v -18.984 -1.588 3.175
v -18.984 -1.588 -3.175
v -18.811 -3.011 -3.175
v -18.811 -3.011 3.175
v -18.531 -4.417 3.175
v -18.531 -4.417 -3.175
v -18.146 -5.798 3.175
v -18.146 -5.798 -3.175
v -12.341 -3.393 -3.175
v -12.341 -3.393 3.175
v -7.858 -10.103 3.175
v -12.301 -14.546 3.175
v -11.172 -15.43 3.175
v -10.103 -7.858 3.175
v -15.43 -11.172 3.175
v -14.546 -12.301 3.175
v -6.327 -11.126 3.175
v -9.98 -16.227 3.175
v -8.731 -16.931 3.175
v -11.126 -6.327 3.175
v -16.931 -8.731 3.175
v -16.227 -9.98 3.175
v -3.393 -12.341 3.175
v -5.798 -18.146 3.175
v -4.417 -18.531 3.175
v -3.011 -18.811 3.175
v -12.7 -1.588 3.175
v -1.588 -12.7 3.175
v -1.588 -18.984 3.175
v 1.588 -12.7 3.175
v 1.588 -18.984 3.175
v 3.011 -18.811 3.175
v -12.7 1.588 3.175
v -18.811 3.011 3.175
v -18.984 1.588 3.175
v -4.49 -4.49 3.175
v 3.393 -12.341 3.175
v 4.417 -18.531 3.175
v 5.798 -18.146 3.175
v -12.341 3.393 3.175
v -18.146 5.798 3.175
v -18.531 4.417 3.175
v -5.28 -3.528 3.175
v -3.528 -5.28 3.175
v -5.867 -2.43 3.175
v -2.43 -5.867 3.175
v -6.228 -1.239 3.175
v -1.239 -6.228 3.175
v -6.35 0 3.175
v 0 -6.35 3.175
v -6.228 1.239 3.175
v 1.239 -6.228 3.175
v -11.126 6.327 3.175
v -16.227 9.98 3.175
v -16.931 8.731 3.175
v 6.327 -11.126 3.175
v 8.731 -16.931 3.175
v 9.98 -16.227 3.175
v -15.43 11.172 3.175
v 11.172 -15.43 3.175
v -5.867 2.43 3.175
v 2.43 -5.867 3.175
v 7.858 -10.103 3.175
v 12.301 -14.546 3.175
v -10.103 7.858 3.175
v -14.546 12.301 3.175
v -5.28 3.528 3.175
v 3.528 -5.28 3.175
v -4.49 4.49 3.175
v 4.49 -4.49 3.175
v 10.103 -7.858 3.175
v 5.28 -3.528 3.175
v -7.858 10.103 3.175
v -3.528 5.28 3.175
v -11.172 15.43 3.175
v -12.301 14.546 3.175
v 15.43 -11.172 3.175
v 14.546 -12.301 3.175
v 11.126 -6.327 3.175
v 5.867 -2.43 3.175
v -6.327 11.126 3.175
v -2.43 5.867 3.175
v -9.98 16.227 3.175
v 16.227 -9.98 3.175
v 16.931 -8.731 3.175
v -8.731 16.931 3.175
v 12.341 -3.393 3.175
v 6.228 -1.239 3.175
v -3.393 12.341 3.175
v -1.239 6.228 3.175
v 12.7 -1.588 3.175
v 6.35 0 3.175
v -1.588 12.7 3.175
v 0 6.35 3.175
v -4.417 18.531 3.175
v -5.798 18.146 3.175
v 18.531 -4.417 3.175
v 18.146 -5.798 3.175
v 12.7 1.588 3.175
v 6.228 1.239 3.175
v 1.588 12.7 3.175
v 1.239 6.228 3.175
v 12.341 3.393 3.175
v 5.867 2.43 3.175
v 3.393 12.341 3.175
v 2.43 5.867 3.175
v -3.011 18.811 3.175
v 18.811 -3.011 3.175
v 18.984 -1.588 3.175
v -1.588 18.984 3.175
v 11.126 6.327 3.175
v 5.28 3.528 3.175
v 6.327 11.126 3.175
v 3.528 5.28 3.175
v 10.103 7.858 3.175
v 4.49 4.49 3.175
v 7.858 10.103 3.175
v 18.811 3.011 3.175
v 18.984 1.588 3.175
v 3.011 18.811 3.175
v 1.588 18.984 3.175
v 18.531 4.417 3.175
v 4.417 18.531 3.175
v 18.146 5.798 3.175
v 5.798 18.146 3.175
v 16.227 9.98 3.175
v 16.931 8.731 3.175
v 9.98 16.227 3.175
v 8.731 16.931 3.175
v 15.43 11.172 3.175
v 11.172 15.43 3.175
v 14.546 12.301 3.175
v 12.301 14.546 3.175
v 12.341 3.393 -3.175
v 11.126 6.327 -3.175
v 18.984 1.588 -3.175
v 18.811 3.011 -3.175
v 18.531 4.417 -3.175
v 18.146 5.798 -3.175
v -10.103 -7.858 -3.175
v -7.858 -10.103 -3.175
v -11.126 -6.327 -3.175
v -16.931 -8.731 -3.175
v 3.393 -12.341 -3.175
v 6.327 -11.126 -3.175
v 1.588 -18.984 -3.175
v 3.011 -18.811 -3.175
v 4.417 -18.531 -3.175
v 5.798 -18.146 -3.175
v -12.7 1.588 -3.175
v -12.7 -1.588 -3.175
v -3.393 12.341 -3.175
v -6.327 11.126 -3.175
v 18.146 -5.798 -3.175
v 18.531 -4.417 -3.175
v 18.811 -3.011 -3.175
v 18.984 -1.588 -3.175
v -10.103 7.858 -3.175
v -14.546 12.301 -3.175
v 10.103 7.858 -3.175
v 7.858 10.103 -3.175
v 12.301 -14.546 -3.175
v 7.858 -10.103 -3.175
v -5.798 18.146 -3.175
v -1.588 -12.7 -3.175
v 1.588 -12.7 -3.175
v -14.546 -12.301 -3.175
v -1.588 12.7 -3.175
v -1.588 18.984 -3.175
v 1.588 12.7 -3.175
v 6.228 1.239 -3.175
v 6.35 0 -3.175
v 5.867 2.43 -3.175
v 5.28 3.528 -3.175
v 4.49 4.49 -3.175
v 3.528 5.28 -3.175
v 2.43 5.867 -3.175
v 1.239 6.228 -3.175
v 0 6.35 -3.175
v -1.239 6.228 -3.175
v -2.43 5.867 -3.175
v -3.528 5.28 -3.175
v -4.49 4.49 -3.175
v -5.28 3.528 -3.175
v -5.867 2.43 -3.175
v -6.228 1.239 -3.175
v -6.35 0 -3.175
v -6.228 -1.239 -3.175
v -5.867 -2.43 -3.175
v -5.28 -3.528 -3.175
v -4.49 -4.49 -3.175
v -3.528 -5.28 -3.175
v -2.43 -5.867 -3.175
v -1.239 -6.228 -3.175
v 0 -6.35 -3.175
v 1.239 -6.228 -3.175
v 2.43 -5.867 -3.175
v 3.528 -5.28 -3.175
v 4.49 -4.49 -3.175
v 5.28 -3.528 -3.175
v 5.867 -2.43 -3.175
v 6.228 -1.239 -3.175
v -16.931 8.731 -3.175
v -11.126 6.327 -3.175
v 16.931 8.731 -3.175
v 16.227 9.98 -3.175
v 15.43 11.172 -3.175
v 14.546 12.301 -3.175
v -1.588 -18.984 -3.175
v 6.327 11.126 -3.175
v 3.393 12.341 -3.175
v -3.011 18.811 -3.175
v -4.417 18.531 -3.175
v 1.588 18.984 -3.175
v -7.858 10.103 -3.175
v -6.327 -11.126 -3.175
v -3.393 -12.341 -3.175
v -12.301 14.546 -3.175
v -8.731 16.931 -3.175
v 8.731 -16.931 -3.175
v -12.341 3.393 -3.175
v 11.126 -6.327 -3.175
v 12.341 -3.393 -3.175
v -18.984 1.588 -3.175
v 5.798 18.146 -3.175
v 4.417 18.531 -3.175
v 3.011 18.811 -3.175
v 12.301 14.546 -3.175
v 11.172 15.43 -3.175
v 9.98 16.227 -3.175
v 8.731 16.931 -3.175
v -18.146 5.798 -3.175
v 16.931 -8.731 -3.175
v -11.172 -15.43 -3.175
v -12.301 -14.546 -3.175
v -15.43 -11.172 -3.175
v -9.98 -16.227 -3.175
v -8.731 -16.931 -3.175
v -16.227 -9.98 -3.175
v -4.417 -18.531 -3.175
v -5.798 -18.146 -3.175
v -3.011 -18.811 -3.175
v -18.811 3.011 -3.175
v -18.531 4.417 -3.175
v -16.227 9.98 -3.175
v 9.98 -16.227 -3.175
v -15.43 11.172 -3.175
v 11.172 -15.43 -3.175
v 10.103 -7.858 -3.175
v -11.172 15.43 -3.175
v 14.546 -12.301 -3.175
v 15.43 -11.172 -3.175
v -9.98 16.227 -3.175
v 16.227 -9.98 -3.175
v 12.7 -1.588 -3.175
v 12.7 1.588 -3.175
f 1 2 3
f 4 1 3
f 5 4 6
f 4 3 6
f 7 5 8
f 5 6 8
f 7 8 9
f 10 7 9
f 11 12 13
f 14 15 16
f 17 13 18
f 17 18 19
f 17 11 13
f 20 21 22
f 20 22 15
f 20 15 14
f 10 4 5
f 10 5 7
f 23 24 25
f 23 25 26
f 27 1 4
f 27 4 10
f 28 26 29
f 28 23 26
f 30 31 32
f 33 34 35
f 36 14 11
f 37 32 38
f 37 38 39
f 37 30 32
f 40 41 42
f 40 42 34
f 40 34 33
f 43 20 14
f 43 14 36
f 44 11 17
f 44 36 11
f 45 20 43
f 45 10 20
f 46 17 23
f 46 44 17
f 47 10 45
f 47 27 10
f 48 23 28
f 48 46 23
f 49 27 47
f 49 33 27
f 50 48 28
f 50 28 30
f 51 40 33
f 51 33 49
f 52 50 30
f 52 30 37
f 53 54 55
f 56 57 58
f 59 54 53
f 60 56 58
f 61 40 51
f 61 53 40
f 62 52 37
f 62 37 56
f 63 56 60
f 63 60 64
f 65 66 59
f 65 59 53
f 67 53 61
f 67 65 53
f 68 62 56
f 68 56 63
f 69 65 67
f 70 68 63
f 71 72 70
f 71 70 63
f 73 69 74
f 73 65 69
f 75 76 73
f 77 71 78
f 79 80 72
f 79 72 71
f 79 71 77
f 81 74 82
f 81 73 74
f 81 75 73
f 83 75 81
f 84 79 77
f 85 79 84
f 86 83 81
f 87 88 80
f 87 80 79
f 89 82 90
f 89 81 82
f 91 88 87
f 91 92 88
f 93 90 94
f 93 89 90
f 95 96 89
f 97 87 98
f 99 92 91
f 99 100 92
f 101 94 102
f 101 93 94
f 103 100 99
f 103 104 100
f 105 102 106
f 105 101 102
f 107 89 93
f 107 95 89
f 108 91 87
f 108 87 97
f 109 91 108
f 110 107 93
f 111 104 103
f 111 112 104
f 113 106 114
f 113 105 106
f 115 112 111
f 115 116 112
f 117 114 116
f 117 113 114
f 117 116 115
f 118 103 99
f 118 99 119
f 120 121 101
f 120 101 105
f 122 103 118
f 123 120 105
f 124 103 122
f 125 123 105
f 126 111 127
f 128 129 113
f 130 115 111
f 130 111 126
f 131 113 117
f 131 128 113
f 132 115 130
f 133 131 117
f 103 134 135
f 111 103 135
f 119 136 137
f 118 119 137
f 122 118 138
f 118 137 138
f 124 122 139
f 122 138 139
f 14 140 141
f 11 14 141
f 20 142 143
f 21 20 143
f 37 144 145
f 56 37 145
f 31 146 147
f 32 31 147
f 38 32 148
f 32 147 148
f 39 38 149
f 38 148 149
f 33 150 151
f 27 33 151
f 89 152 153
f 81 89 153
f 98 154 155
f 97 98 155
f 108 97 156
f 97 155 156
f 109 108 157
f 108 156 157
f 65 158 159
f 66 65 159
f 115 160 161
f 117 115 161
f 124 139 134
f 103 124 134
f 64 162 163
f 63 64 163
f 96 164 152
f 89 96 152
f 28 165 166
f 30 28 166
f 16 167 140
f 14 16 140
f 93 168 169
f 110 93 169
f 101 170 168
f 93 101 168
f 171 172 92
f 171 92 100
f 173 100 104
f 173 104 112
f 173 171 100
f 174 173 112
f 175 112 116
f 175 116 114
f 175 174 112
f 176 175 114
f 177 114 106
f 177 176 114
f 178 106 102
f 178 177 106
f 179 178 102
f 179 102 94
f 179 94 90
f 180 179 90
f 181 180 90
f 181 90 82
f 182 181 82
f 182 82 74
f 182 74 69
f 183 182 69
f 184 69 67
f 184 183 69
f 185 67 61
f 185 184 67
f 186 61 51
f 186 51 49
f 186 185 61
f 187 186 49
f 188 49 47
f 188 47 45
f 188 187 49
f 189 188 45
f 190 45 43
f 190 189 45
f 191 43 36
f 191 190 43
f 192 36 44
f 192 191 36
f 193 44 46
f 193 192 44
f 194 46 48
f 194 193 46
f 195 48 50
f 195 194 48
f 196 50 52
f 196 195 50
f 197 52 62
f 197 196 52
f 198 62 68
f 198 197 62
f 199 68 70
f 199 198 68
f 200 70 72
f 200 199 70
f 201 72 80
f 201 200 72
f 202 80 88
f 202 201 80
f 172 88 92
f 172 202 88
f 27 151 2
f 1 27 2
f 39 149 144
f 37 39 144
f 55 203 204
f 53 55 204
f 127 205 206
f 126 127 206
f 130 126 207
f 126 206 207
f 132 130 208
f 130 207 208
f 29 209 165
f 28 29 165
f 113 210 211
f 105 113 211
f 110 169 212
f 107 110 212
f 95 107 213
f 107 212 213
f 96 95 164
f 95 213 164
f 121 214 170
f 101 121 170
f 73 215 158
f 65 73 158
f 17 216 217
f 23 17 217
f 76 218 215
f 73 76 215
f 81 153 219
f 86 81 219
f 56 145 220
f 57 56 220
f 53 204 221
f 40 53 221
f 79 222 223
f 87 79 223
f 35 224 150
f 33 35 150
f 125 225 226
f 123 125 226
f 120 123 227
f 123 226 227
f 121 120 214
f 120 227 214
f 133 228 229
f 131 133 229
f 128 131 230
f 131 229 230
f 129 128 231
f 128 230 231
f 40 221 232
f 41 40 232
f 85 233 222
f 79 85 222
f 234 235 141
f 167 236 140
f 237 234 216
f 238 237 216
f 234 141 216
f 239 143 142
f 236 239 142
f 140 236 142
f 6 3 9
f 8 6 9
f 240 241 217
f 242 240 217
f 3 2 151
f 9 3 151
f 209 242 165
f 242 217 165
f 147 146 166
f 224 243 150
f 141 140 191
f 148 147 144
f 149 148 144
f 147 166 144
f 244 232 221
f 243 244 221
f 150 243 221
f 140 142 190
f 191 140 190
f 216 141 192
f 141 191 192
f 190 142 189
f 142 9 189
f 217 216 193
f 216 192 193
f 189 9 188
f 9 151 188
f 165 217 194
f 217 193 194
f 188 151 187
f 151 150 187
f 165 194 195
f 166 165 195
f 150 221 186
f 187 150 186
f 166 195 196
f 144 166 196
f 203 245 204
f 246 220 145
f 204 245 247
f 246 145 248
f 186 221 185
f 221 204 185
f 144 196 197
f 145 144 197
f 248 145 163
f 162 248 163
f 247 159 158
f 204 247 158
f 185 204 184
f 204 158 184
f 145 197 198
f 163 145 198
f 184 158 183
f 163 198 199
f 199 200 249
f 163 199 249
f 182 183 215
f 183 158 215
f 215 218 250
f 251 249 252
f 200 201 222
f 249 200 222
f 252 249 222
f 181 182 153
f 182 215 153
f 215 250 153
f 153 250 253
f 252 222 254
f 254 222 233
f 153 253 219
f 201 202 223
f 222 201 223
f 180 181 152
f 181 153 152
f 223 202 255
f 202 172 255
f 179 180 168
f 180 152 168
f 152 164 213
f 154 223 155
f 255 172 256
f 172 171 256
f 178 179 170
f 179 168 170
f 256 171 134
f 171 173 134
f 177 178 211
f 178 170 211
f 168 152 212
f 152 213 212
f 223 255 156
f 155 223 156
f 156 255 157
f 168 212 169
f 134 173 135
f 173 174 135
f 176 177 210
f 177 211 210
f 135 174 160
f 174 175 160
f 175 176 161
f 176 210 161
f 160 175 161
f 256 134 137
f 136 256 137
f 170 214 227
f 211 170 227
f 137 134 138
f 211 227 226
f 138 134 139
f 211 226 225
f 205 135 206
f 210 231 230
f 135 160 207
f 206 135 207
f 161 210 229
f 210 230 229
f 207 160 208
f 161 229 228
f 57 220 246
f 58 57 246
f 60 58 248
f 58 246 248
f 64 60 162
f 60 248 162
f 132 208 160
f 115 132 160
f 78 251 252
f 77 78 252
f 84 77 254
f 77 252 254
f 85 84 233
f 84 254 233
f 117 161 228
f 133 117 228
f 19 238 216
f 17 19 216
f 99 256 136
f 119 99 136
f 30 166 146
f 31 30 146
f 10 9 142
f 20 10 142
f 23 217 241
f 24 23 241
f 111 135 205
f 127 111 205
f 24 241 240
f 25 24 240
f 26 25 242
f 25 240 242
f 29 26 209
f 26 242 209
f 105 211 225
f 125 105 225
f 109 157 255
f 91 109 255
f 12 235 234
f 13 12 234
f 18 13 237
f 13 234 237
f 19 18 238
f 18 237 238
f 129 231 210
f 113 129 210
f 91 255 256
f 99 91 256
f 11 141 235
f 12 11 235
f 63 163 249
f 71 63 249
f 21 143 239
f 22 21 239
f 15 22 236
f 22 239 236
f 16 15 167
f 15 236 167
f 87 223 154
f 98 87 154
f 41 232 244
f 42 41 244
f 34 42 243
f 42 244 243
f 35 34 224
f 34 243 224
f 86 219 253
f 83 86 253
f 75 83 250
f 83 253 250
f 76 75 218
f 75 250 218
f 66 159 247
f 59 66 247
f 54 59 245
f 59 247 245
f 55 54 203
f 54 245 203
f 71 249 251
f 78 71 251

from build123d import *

# Parameters (mm, degrees)
BOSS_EXTRUDE1_DEPTH      = 3.175
BOSS_EXTRUDE1_DEPTH_BACK = 3.175
SKETCH1_R                = 6.35


with BuildPart() as part:
    # Sketch1 → Boss-Extrude1 (new, two sides: drawn at the far end of the back side and taken through both)
    with BuildSketch(Plane.XY.offset(-BOSS_EXTRUDE1_DEPTH_BACK)):
        with BuildLine():
            ThreePointArc((5.798103615, 18.146197797), (3.716470634, 18.683959592), (1.5875, 18.98373893))
            Line((1.5875, 18.98373893), (1.5875, 12.7))
            Line((1.5875, 12.7), (-1.5875, 12.7))
            Line((-1.5875, 12.7), (-1.5875, 18.98373893))
            ThreePointArc((-1.5875, 18.98373893), (-3.716470634, 18.683959592), (-5.798103615, 18.146197797))
            Line((-5.798103615, 18.146197797), (-3.393420833, 12.340780012))
            Line((-3.393420833, 12.340780012), (-6.326738349, 11.125760114))
            Line((-6.326738349, 11.125760114), (-8.731421131, 16.931177899))
            ThreePointArc((-8.731421131, 16.931177899), (-10.583612939, 15.839496114), (-12.300998514, 14.546062545))
            Line((-12.300998514, 14.546062545), (-7.857724106, 10.102788136))
            Line((-7.857724106, 10.102788136), (-10.102788136, 7.857724106))
            Line((-10.102788136, 7.857724106), (-14.546062545, 12.300998514))
            ThreePointArc((-14.546062545, 12.300998514), (-15.839496114, 10.583612939), (-16.931177899, 8.731421131))
            Line((-16.931177899, 8.731421131), (-11.125760114, 6.326738349))
            Line((-11.125760114, 6.326738349), (-12.340780012, 3.393420833))
            Line((-12.340780012, 3.393420833), (-18.146197797, 5.798103615))
            ThreePointArc((-18.146197797, 5.798103615), (-18.683959592, 3.716470634), (-18.98373893, 1.5875))
            Line((-18.98373893, 1.5875), (-12.7, 1.5875))
            Line((-12.7, 1.5875), (-12.7, -1.5875))
            Line((-12.7, -1.5875), (-18.98373893, -1.5875))
            ThreePointArc((-18.98373893, -1.5875), (-18.683959592, -3.716470634), (-18.146197797, -5.798103615))
            Line((-18.146197797, -5.798103615), (-12.340780012, -3.393420833))
            Line((-12.340780012, -3.393420833), (-11.125760114, -6.326738349))
            Line((-11.125760114, -6.326738349), (-16.931177899, -8.731421131))
            ThreePointArc((-16.931177899, -8.731421131), (-15.839496114, -10.583612939), (-14.546062545, -12.300998514))
            Line((-14.546062545, -12.300998514), (-10.102788136, -7.857724106))
            Line((-10.102788136, -7.857724106), (-7.857724106, -10.102788136))
            Line((-7.857724106, -10.102788136), (-12.300998514, -14.546062545))
            ThreePointArc((-12.300998514, -14.546062545), (-10.583612939, -15.839496114), (-8.731421131, -16.931177899))
            Line((-8.731421131, -16.931177899), (-6.326738349, -11.125760114))
            Line((-6.326738349, -11.125760114), (-3.393420833, -12.340780012))
            Line((-3.393420833, -12.340780012), (-5.798103615, -18.146197797))
            ThreePointArc((-5.798103615, -18.146197797), (-3.716470634, -18.683959592), (-1.5875, -18.98373893))
            Line((-1.5875, -18.98373893), (-1.5875, -12.7))
            Line((-1.5875, -12.7), (1.5875, -12.7))
            Line((1.5875, -12.7), (1.5875, -18.98373893))
            ThreePointArc((1.5875, -18.98373893), (3.716470634, -18.683959592), (5.798103615, -18.146197797))
            Line((5.798103615, -18.146197797), (3.393420833, -12.340780012))
            Line((3.393420833, -12.340780012), (6.326738349, -11.125760114))
            Line((6.326738349, -11.125760114), (8.731421131, -16.931177899))
            ThreePointArc((8.731421131, -16.931177899), (10.583612939, -15.839496114), (12.300998514, -14.546062545))
            Line((12.300998514, -14.546062545), (7.857724106, -10.102788136))
            Line((7.857724106, -10.102788136), (10.102788136, -7.857724106))
            Line((10.102788136, -7.857724106), (14.546062545, -12.300998514))
            ThreePointArc((14.546062545, -12.300998514), (15.839496114, -10.583612939), (16.931177899, -8.731421131))
            Line((16.931177899, -8.731421131), (11.125760114, -6.326738349))
            Line((11.125760114, -6.326738349), (12.340780012, -3.393420833))
            Line((12.340780012, -3.393420833), (18.146197797, -5.798103615))
            ThreePointArc((18.146197797, -5.798103615), (18.683959592, -3.716470634), (18.98373893, -1.5875))
            Line((18.98373893, -1.5875), (12.7, -1.5875))
            Line((12.7, -1.5875), (12.7, 1.5875))
            Line((12.7, 1.5875), (18.98373893, 1.5875))
            ThreePointArc((18.98373893, 1.5875), (18.683959592, 3.716470634), (18.146197797, 5.798103615))
            Line((18.146197797, 5.798103615), (12.340780012, 3.393420833))
            Line((12.340780012, 3.393420833), (11.125760114, 6.326738349))
            Line((11.125760114, 6.326738349), (16.931177899, 8.731421131))
            ThreePointArc((16.931177899, 8.731421131), (15.839496114, 10.583612939), (14.546062545, 12.300998514))
            Line((14.546062545, 12.300998514), (10.102788136, 7.857724106))
            Line((10.102788136, 7.857724106), (7.857724106, 10.102788136))
            Line((7.857724106, 10.102788136), (12.300998514, 14.546062545))
            ThreePointArc((12.300998514, 14.546062545), (10.583612939, 15.839496114), (8.731421131, 16.931177899))
            Line((8.731421131, 16.931177899), (6.326738349, 11.125760114))
            Line((6.326738349, 11.125760114), (3.393420833, 12.340780012))
            Line((3.393420833, 12.340780012), (5.798103615, 18.146197797))
        make_face()
        Circle(SKETCH1_R, mode=Mode.SUBTRACT)
    extrude(amount=BOSS_EXTRUDE1_DEPTH + BOSS_EXTRUDE1_DEPTH_BACK)


solid = part.part
